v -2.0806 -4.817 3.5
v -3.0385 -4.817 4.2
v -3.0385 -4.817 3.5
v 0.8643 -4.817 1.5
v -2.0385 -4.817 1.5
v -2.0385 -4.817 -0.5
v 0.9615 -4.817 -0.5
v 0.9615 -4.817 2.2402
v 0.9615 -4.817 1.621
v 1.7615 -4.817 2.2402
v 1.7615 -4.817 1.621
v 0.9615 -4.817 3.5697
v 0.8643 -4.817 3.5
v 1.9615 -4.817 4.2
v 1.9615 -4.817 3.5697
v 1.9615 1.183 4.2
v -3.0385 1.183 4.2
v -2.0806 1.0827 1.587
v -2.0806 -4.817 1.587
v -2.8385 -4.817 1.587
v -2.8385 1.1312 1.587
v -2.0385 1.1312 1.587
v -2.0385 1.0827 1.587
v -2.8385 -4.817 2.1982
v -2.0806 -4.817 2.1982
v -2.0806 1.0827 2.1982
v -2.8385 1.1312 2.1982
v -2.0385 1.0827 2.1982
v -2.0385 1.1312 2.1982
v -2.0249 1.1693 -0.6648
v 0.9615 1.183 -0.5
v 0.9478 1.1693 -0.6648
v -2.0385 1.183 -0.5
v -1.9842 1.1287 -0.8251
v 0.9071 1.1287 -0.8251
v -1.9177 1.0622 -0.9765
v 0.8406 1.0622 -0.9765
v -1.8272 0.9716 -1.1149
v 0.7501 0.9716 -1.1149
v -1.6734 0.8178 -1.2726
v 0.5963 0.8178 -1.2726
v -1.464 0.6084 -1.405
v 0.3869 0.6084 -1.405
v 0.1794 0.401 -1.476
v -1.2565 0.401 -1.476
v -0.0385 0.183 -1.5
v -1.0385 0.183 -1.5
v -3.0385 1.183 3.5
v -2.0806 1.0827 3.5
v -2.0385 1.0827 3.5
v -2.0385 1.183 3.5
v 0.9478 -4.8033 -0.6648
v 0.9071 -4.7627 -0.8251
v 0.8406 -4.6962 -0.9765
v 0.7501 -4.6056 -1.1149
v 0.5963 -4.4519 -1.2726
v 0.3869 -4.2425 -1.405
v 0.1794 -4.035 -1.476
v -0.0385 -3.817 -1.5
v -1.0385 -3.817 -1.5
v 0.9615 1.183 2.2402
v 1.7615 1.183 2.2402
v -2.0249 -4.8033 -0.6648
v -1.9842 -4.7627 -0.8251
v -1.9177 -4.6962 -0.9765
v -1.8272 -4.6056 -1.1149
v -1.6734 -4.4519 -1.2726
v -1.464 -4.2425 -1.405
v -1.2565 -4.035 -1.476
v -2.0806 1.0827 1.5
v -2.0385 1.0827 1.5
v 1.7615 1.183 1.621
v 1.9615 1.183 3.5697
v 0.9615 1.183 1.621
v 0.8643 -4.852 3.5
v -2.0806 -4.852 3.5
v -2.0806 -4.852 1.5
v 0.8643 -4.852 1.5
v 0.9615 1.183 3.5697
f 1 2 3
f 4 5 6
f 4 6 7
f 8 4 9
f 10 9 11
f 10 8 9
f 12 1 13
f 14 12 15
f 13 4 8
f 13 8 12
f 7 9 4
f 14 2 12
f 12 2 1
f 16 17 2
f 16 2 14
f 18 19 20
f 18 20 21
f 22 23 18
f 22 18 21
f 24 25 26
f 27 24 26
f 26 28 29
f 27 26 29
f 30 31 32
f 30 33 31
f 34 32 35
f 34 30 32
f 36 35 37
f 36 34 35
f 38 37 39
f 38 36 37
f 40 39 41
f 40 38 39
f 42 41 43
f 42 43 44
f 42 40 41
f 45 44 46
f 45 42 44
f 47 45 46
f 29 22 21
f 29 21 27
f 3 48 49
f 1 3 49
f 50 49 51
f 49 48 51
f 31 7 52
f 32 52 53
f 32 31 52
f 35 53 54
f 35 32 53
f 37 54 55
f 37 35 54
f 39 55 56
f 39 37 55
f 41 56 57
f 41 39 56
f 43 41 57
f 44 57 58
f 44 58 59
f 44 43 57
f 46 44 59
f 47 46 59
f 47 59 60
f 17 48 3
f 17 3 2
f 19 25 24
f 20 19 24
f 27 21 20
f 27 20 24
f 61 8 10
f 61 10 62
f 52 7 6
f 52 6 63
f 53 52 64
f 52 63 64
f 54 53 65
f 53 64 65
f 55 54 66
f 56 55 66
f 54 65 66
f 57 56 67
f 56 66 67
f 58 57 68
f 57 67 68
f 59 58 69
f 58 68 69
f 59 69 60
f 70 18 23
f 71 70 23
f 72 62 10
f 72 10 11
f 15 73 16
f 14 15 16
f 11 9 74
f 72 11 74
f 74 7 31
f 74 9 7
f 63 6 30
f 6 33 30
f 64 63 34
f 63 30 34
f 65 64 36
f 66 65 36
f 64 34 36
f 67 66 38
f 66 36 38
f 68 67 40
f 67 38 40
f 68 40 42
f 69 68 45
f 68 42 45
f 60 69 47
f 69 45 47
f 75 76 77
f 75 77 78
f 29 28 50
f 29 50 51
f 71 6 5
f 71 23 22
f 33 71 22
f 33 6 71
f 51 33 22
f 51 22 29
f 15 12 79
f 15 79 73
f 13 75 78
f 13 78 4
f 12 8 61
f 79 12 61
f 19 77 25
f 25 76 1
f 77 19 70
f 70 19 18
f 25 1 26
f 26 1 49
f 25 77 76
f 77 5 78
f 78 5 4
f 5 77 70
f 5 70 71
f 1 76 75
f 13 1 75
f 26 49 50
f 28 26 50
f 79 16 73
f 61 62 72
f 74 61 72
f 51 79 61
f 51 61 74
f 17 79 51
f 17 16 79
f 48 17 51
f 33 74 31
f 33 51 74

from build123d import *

# Parameters (mm, degrees)
SKETCH_3_W           = 3
SKETCH_3_H           = 6
EXTRUDE_2_DEPTH      = 3.5
SKETCH_4_OUTSIDE_W   = 6.514
SKETCH_4_OUTSIDE_H   = 9.514
SKETCH_4_OUTSIDE_W_2 = 1.417406922
SKETCH_4_OUTSIDE_H_2 = 3.080497711
CUT_EXTRUDE_1_DEPTH  = 0.8
SKETCH_9_W           = 3
SKETCH_9_H           = 6
EXTRUDE_5_DEPTH      = 1.5
FILLET_2_R           = 1
SKETCH_6_W           = 0.611138618
SKETCH_6_H           = 5.948224028
EXTRUDE_3_DEPTH      = 0.8
SKETCH_8_W           = 0.619217593
SKETCH_8_H           = 6
EXTRUDE_4_DEPTH      = 0.8
SKETCH_10_W          = 2.94488386
SKETCH_10_H          = 5.934698602
EXTRUDE_6_DEPTH      = 2
SKETCH_11_W          = 3
SKETCH_11_H          = 6
EXTRUDE_7_DEPTH      = 1.5
SKETCH_12_W          = 0.7
SKETCH_12_H          = 6
EXTRUDE_8_DEPTH      = 1.5
SKETCH_13_W          = 0.6302849
SKETCH_13_H          = 6
EXTRUDE_9_DEPTH      = 1.5
SKETCH_14_W          = 0.6302849
SKETCH_14_H          = 6
CUT_EXTRUDE_2_DEPTH  = 0.5
SKETCH_15_W          = 0.7
SKETCH_15_H          = 6
CUT_EXTRUDE_3_DEPTH  = 0.5
SKETCH_16_W          = 5
SKETCH_16_H          = 0.6302849
EXTRUDE_10_DEPTH     = 1
SKETCH_17_W          = 5
SKETCH_17_H          = 0.7
EXTRUDE_11_DEPTH     = 1
SKETCH_18_W          = 5
SKETCH_18_H          = 0.6302849
CUT_EXTRUDE_4_DEPTH  = 1
SKETCH_19_W          = 5
SKETCH_19_H          = 0.7
CUT_EXTRUDE_5_DEPTH  = 1


with BuildPart() as part:
    # 草图3 → 凸台-拉伸2 (new body)
    with BuildSketch(Plane.XY):
        with Locations((-0.538539978, -1.817017803)):
            Rectangle(SKETCH_3_W, SKETCH_3_H)
    extrude(amount=EXTRUDE_2_DEPTH)

    # 草图4 outside → 切除-拉伸1 (cut)
    with BuildSketch(Plane.XY.offset(3.5)):
        with Locations((-0.539, -1.817)):
            Rectangle(SKETCH_4_OUTSIDE_W, SKETCH_4_OUTSIDE_H)
        with Locations((-0.530790021, -1.736698078)):
            Rectangle(SKETCH_4_OUTSIDE_W_2, SKETCH_4_OUTSIDE_H_2, mode=Mode.SUBTRACT)
    extrude(amount=-CUT_EXTRUDE_1_DEPTH, mode=Mode.SUBTRACT)

    # 草图9 → 凸台-拉伸5 (add)
    with BuildSketch(Plane(origin=(0, 0, 0), x_dir=(-1, 0, 0), z_dir=(0, 0, -1))):
        with Locations((0.538539978, -1.817017803)):
            Rectangle(SKETCH_9_W, SKETCH_9_H)
    extrude(amount=EXTRUDE_5_DEPTH)

    # 圆角2
    fillet_2_edges = [part.edges().sort_by_distance(p)[0] for p in [
        (0.961460022, -1.817017803, -1.5),
        (-0.538539978, -4.817017803, -1.5),
        (-2.038539978, -1.817017803, -1.5),
        (-0.538539978, 1.182982197, -1.5),
    ]]
    fillet(fillet_2_edges, radius=FILLET_2_R)

    # 草图6 → 凸台-拉伸3 (add)
    with BuildSketch(Plane.ZY.offset(2.038539978)):
        with Locations((1.892599011, -1.842905789)):
            Rectangle(SKETCH_6_W, SKETCH_6_H)
    extrude(amount=EXTRUDE_3_DEPTH)

    # 草图8 → 凸台-拉伸4 (add)
    with BuildSketch(Plane(origin=(0.961460022, 0, 0), x_dir=(0, 0, -1), z_dir=(1, 0, 0))):
        with Locations((-1.93059109, -1.817017803)):
            Rectangle(SKETCH_8_W, SKETCH_8_H)
    extrude(amount=EXTRUDE_4_DEPTH)

    # 草图10 → 凸台-拉伸6 (add)
    with BuildSketch(Plane.XY.offset(3.5)):
        with Locations((-0.608169547, -1.884686131)):
            Rectangle(SKETCH_10_W, SKETCH_10_H)
    extrude(amount=-EXTRUDE_6_DEPTH)

    # 草图11 → 凸台-拉伸7 (add)
    with BuildSketch(Plane.XY.offset(2.7)):
        with Locations((-0.538539978, -1.817017803)):
            Rectangle(SKETCH_11_W, SKETCH_11_H)
    extrude(amount=EXTRUDE_7_DEPTH)

    # 草图12 → 凸台-拉伸8 (add)
    with BuildSketch(Plane.ZY.offset(2.038539978)):
        with Locations((3.85, -1.817017803)):
            Rectangle(SKETCH_12_W, SKETCH_12_H)
    extrude(amount=EXTRUDE_8_DEPTH)

    # 草图13 → 凸台-拉伸9 (add)
    with BuildSketch(Plane(origin=(0.961460022, 0, 0), x_dir=(0, 0, -1), z_dir=(1, 0, 0))):
        with Locations((-3.88485755, -1.817017803)):
            Rectangle(SKETCH_13_W, SKETCH_13_H)
    extrude(amount=EXTRUDE_9_DEPTH)

    # 草图14 → 切除-拉伸2 (cut)
    with BuildSketch(Plane(origin=(2.461460022, 0, 0), x_dir=(0, 0, -1), z_dir=(1, 0, 0))):
        with Locations((-3.88485755, -1.817017803)):
            Rectangle(SKETCH_14_W, SKETCH_14_H)
    extrude(amount=-CUT_EXTRUDE_2_DEPTH, mode=Mode.SUBTRACT)

    # 草图15 → 切除-拉伸3 (cut)
    with BuildSketch(Plane.ZY.offset(3.538539978)):
        with Locations((3.85, -1.817017803)):
            Rectangle(SKETCH_15_W, SKETCH_15_H)
    extrude(amount=-CUT_EXTRUDE_3_DEPTH, mode=Mode.SUBTRACT)

    # 草图16 → 凸台-拉伸10 (add)
    with BuildSketch(Plane(origin=(0, 1.182982197, 0), x_dir=(1, 0, 0), z_dir=(0, 1, 0))):
        with Locations((-0.538539978, -3.88485755)):
            Rectangle(SKETCH_16_W, SKETCH_16_H)
    extrude(amount=EXTRUDE_10_DEPTH)

    # 草图17 → 凸台-拉伸11 (add)
    with BuildSketch(Plane.XZ.offset(4.817017803)):
        with Locations((-0.538539978, 3.85)):
            Rectangle(SKETCH_17_W, SKETCH_17_H)
    extrude(amount=EXTRUDE_11_DEPTH)

    # 草图18 → 切除-拉伸4 (cut)
    with BuildSketch(Plane(origin=(0, 2.182982197, 0), x_dir=(1, 0, 0), z_dir=(0, 1, 0))):
        with Locations((-0.538539978, -3.88485755)):
            Rectangle(SKETCH_18_W, SKETCH_18_H)
    extrude(amount=-CUT_EXTRUDE_4_DEPTH, mode=Mode.SUBTRACT)

    # 草图19 → 切除-拉伸5 (cut)
    with BuildSketch(Plane.XZ.offset(5.817017803)):
        with Locations((-0.538539978, 3.85)):
            Rectangle(SKETCH_19_W, SKETCH_19_H)
    extrude(amount=-CUT_EXTRUDE_5_DEPTH, mode=Mode.SUBTRACT)


solid = part.part
